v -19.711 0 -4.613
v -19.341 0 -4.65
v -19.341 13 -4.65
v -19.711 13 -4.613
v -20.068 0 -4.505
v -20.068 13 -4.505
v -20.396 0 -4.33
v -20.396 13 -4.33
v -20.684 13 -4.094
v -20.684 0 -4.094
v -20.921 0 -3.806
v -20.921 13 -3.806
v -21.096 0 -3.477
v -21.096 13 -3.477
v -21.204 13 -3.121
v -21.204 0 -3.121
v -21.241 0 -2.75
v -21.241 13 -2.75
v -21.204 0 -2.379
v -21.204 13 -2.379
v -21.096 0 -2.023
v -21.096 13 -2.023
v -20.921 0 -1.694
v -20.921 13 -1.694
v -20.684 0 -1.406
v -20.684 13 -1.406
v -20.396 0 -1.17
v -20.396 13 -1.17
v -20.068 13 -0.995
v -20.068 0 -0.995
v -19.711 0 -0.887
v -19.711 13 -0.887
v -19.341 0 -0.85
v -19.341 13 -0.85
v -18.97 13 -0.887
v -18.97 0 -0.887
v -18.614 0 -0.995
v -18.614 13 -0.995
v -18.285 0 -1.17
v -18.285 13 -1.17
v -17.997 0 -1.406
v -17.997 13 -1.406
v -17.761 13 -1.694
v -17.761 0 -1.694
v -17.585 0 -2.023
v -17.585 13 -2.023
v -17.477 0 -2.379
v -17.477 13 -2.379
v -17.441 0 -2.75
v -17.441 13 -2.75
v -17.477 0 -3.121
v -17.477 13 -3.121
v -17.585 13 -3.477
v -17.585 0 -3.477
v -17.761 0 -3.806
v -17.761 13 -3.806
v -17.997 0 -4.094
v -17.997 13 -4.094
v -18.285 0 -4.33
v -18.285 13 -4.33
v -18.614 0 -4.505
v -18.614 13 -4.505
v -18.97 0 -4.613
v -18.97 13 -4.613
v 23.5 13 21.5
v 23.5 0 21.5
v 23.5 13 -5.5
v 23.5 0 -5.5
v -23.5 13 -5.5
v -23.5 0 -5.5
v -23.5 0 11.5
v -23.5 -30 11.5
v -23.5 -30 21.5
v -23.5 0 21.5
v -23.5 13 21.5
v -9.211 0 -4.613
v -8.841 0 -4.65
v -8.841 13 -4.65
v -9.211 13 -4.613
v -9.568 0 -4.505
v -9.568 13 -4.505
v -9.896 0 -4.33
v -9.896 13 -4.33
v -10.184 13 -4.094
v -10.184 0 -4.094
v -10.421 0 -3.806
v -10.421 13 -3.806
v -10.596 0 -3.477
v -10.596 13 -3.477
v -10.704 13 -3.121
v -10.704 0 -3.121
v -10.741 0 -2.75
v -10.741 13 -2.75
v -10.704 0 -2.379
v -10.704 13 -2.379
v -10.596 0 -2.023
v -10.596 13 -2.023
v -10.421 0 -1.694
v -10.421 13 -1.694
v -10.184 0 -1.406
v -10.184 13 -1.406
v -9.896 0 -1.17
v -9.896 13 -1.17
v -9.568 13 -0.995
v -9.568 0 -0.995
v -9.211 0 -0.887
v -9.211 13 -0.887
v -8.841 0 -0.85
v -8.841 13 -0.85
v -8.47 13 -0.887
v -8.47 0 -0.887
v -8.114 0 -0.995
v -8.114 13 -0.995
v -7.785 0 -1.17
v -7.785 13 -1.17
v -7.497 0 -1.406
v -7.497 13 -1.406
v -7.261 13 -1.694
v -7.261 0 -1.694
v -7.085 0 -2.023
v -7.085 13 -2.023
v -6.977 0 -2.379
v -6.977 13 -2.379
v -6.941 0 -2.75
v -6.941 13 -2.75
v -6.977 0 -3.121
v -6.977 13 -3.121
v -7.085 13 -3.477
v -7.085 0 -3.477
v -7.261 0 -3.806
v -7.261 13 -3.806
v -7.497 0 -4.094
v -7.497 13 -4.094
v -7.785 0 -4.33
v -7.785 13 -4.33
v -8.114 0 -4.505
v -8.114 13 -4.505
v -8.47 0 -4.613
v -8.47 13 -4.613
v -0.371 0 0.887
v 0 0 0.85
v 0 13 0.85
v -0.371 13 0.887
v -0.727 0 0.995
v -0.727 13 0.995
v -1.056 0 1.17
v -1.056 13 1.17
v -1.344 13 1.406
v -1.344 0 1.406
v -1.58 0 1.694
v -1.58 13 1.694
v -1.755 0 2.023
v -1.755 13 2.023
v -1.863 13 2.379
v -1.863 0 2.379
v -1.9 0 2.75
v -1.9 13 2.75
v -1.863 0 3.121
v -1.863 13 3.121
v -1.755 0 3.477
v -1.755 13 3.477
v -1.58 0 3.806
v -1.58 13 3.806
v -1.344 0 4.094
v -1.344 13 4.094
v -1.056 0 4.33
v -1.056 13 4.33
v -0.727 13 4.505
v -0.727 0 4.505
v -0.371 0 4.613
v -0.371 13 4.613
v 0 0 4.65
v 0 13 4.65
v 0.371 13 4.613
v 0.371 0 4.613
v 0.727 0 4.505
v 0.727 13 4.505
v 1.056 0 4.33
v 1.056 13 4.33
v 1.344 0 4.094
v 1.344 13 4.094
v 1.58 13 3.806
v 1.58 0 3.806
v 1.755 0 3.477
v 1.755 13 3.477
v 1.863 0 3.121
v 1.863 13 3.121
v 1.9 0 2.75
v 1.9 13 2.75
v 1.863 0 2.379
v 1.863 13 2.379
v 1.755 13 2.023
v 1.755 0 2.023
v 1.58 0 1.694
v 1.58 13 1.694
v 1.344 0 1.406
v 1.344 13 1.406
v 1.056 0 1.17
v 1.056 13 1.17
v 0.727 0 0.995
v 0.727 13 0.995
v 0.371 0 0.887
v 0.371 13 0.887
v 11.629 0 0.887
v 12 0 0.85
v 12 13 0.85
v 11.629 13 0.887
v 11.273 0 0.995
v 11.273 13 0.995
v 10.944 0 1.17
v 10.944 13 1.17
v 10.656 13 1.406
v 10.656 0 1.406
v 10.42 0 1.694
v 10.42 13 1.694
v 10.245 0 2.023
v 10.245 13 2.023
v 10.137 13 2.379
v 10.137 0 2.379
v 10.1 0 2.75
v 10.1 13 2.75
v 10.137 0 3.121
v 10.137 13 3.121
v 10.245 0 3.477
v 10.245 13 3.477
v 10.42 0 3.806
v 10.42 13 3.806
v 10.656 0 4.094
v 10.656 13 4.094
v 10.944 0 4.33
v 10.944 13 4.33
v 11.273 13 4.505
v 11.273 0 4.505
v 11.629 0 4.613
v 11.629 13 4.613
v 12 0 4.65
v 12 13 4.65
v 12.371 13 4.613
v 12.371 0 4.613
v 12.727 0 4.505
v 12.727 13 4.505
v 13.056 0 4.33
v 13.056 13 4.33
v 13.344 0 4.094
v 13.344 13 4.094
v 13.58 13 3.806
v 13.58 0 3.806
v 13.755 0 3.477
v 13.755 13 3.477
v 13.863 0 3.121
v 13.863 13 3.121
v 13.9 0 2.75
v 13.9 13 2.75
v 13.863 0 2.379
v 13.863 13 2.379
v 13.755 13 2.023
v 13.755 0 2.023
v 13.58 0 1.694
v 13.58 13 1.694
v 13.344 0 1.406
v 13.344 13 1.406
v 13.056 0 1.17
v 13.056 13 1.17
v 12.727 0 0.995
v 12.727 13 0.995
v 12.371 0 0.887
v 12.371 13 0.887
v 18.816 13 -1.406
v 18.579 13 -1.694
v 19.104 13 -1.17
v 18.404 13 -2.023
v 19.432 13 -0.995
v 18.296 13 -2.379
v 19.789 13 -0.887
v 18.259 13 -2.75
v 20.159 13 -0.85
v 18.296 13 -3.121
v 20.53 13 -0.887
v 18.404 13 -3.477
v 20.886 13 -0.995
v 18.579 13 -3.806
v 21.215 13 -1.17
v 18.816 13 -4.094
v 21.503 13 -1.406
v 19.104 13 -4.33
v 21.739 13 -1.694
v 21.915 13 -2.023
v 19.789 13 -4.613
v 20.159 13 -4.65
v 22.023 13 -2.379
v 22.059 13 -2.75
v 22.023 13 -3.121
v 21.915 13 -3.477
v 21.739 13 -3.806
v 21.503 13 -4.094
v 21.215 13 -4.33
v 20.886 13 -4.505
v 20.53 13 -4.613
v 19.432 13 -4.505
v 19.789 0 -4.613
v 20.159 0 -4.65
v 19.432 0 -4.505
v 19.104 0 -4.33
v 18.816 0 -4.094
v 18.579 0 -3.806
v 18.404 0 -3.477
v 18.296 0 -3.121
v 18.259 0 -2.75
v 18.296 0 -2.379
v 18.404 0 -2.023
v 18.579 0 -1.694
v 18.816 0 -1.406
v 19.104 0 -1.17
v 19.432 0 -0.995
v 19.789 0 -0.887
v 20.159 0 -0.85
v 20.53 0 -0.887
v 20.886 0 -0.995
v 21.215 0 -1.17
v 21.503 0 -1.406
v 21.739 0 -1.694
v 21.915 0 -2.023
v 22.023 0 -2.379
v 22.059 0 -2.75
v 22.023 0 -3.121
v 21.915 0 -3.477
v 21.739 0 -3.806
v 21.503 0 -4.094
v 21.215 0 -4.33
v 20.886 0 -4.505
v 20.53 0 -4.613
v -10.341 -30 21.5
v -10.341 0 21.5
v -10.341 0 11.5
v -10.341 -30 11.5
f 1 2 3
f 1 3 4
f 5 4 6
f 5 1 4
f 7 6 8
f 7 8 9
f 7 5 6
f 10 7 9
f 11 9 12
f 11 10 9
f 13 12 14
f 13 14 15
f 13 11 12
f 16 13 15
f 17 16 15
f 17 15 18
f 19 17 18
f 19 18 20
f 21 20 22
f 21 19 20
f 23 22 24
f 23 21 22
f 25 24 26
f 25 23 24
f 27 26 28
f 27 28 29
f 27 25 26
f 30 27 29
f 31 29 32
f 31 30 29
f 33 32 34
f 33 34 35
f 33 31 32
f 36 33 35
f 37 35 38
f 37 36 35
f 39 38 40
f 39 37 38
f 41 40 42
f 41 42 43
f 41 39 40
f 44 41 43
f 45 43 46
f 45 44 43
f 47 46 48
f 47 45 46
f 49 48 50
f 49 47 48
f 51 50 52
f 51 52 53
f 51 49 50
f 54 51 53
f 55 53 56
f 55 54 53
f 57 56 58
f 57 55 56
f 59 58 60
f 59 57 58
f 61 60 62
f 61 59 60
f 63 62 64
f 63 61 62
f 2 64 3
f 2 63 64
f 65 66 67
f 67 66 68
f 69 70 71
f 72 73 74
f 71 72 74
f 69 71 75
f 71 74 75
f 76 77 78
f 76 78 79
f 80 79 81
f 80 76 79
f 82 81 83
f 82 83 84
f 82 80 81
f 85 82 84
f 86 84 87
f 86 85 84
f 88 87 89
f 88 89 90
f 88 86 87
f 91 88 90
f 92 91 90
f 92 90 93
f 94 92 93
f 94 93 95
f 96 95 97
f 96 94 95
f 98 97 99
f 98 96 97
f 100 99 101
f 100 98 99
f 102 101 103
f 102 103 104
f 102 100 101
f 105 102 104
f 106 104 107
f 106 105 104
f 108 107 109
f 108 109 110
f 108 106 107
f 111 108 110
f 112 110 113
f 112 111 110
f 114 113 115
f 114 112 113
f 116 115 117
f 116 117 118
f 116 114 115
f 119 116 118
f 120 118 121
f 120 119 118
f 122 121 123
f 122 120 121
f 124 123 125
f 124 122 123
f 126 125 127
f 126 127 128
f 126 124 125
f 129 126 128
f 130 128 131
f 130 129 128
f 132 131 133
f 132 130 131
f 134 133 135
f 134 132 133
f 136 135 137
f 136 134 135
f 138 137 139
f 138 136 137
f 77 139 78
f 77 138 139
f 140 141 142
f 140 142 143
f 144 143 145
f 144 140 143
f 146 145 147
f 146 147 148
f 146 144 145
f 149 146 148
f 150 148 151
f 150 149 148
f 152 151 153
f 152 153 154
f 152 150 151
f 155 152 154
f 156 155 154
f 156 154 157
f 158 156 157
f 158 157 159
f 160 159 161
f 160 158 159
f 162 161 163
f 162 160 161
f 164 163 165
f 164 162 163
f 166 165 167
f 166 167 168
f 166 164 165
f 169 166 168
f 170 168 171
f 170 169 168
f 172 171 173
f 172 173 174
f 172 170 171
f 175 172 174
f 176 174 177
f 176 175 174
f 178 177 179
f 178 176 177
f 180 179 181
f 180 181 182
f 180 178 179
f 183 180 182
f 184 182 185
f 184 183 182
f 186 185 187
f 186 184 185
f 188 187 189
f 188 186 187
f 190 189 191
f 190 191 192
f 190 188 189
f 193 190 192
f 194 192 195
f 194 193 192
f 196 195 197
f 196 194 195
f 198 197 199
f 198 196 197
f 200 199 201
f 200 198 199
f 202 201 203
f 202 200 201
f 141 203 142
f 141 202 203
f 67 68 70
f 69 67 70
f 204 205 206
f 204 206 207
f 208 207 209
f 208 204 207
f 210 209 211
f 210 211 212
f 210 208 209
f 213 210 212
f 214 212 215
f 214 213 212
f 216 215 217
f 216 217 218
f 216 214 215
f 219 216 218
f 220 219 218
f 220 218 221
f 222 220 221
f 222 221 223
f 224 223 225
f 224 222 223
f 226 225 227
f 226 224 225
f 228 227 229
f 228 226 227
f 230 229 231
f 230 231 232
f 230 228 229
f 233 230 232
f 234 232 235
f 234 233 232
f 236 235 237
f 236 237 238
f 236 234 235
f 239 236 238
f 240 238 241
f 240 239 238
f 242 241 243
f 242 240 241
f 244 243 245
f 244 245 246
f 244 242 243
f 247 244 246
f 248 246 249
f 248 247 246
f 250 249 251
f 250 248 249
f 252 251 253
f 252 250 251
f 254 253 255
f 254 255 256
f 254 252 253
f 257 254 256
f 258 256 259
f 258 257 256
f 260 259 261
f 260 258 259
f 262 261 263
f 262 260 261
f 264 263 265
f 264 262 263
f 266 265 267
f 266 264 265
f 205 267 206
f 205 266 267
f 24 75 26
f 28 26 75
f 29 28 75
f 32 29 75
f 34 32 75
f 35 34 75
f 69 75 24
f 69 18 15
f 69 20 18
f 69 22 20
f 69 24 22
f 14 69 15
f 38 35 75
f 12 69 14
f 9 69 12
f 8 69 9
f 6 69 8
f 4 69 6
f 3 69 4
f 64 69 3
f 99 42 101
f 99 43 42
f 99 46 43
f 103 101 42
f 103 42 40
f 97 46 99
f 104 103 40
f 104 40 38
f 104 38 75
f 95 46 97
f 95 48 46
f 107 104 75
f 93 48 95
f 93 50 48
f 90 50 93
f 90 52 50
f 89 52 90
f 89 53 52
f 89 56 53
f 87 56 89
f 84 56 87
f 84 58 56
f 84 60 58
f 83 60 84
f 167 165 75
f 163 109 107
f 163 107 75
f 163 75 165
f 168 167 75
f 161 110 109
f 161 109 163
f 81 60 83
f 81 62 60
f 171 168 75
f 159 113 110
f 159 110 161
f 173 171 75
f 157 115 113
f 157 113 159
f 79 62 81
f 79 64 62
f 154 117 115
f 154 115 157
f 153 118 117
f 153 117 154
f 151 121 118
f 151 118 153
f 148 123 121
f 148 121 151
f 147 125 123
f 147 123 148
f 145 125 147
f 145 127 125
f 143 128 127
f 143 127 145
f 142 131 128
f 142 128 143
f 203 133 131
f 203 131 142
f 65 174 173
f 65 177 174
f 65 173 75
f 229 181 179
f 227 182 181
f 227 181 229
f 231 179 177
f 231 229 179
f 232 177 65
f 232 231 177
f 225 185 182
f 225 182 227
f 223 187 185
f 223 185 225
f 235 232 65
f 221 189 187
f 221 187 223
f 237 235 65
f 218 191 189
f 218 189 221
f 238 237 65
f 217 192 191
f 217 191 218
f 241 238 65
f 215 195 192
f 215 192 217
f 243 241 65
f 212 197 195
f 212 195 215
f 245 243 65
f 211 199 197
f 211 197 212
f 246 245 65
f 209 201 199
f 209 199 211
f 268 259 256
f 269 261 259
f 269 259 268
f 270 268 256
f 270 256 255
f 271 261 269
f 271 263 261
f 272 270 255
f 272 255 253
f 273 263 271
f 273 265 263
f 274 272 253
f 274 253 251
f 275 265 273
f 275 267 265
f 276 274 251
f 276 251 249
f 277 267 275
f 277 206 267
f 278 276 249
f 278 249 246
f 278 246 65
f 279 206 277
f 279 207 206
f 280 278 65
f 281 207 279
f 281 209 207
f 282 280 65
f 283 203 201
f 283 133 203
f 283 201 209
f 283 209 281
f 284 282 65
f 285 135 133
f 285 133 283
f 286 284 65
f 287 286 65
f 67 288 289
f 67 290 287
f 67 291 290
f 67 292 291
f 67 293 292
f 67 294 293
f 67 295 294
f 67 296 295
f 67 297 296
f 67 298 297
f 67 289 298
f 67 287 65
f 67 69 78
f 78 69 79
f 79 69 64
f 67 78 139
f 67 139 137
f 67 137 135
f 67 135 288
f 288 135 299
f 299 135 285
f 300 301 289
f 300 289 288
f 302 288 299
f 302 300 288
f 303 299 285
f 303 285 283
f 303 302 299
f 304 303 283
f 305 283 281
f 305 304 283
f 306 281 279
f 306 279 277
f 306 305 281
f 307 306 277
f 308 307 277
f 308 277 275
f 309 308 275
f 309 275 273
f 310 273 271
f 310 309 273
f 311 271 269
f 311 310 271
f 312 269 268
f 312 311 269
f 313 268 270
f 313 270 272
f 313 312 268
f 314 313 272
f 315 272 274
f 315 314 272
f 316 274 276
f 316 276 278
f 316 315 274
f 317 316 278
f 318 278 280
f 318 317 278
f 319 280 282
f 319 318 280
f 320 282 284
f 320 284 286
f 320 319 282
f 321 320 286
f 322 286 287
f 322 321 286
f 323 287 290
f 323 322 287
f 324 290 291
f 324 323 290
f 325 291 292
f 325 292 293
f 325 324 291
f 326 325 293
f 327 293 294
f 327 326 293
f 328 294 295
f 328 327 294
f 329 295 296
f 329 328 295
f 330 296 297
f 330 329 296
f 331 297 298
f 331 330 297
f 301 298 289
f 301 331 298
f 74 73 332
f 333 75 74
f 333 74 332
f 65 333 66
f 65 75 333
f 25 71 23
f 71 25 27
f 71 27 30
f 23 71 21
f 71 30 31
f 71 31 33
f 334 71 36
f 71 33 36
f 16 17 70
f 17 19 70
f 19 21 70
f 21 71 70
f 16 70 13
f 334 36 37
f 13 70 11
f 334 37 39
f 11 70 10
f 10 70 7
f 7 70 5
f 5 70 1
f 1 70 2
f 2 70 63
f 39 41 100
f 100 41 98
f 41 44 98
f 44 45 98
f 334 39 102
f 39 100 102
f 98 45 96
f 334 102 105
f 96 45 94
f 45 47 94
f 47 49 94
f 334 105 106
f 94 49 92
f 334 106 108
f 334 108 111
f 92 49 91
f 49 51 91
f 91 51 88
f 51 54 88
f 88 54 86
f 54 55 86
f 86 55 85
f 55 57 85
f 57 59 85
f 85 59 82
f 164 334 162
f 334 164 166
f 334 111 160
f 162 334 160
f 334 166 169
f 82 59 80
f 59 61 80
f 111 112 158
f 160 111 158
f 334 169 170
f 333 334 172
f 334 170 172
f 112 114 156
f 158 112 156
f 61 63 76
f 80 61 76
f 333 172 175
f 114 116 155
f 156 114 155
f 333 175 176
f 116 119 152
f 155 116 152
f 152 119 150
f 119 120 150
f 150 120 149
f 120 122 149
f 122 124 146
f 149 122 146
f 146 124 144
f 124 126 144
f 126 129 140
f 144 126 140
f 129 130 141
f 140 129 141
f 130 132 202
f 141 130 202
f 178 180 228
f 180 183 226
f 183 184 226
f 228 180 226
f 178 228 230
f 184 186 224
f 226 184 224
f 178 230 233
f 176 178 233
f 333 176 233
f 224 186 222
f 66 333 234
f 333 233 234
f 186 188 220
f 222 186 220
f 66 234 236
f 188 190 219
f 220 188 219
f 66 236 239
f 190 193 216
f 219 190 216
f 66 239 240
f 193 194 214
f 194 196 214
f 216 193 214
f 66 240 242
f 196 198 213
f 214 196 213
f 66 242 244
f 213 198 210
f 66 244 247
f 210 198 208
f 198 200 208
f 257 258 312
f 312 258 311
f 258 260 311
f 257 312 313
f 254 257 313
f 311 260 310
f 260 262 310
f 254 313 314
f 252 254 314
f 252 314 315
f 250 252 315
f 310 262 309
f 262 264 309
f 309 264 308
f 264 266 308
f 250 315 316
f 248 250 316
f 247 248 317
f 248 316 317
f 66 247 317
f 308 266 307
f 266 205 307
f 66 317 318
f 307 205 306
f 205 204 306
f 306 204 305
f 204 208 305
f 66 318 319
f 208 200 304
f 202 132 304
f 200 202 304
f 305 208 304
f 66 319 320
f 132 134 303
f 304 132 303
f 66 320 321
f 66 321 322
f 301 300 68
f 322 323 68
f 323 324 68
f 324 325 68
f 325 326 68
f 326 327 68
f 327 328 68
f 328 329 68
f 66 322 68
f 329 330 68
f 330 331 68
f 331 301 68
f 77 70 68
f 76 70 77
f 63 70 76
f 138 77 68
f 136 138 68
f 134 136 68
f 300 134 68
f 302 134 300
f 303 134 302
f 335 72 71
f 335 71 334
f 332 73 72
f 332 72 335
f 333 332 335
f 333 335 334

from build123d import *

# Parameters (mm, degrees)
SKETCH_1_R      = 1.9
EXTRUDE_1_DEPTH = 13
SKETCH_2_W      = 13.159242617
SKETCH_2_H      = 30
EXTRUDE_2_DEPTH = 10


with BuildPart() as part:
    # 草图1 → 凸台-拉伸1 (new body)
    with BuildSketch(Plane(origin=(0, 0, 0), x_dir=(1, 0, 0), z_dir=(0, 1, 0))):
        Polygon((-23.5, -5.5), (-23.5, -21.5), (23.5, -21.5), (23.5, -5.5), (23.5, 5.5), (-23.5, 5.5), align=None)
        with Locations(Location((20.159242617, 2.75, 0), (0, 0, 90))):
            Circle(SKETCH_1_R, mode=Mode.SUBTRACT)
        with Locations(Location((-8.840757383, 2.75, 0), (0, 0, 90))):
            Circle(SKETCH_1_R, mode=Mode.SUBTRACT)
        with Locations(Location((-19.340757383, 2.75, 0), (0, 0, 90))):
            Circle(SKETCH_1_R, mode=Mode.SUBTRACT)
        with Locations(Location((0, -2.75, 0), (0, 0, 90))):
            Circle(SKETCH_1_R, mode=Mode.SUBTRACT)
        with Locations(Location((12, -2.75, 0), (0, 0, 90))):
            Circle(SKETCH_1_R, mode=Mode.SUBTRACT)
    extrude(amount=EXTRUDE_1_DEPTH)

    # 草图2 → 凸台-拉伸2 (add)
    with BuildSketch(Plane.XY.offset(21.5)):
        with Locations((-16.920378692, -15)):
            Rectangle(SKETCH_2_W, SKETCH_2_H)
    extrude(amount=-EXTRUDE_2_DEPTH)


solid = part.part
